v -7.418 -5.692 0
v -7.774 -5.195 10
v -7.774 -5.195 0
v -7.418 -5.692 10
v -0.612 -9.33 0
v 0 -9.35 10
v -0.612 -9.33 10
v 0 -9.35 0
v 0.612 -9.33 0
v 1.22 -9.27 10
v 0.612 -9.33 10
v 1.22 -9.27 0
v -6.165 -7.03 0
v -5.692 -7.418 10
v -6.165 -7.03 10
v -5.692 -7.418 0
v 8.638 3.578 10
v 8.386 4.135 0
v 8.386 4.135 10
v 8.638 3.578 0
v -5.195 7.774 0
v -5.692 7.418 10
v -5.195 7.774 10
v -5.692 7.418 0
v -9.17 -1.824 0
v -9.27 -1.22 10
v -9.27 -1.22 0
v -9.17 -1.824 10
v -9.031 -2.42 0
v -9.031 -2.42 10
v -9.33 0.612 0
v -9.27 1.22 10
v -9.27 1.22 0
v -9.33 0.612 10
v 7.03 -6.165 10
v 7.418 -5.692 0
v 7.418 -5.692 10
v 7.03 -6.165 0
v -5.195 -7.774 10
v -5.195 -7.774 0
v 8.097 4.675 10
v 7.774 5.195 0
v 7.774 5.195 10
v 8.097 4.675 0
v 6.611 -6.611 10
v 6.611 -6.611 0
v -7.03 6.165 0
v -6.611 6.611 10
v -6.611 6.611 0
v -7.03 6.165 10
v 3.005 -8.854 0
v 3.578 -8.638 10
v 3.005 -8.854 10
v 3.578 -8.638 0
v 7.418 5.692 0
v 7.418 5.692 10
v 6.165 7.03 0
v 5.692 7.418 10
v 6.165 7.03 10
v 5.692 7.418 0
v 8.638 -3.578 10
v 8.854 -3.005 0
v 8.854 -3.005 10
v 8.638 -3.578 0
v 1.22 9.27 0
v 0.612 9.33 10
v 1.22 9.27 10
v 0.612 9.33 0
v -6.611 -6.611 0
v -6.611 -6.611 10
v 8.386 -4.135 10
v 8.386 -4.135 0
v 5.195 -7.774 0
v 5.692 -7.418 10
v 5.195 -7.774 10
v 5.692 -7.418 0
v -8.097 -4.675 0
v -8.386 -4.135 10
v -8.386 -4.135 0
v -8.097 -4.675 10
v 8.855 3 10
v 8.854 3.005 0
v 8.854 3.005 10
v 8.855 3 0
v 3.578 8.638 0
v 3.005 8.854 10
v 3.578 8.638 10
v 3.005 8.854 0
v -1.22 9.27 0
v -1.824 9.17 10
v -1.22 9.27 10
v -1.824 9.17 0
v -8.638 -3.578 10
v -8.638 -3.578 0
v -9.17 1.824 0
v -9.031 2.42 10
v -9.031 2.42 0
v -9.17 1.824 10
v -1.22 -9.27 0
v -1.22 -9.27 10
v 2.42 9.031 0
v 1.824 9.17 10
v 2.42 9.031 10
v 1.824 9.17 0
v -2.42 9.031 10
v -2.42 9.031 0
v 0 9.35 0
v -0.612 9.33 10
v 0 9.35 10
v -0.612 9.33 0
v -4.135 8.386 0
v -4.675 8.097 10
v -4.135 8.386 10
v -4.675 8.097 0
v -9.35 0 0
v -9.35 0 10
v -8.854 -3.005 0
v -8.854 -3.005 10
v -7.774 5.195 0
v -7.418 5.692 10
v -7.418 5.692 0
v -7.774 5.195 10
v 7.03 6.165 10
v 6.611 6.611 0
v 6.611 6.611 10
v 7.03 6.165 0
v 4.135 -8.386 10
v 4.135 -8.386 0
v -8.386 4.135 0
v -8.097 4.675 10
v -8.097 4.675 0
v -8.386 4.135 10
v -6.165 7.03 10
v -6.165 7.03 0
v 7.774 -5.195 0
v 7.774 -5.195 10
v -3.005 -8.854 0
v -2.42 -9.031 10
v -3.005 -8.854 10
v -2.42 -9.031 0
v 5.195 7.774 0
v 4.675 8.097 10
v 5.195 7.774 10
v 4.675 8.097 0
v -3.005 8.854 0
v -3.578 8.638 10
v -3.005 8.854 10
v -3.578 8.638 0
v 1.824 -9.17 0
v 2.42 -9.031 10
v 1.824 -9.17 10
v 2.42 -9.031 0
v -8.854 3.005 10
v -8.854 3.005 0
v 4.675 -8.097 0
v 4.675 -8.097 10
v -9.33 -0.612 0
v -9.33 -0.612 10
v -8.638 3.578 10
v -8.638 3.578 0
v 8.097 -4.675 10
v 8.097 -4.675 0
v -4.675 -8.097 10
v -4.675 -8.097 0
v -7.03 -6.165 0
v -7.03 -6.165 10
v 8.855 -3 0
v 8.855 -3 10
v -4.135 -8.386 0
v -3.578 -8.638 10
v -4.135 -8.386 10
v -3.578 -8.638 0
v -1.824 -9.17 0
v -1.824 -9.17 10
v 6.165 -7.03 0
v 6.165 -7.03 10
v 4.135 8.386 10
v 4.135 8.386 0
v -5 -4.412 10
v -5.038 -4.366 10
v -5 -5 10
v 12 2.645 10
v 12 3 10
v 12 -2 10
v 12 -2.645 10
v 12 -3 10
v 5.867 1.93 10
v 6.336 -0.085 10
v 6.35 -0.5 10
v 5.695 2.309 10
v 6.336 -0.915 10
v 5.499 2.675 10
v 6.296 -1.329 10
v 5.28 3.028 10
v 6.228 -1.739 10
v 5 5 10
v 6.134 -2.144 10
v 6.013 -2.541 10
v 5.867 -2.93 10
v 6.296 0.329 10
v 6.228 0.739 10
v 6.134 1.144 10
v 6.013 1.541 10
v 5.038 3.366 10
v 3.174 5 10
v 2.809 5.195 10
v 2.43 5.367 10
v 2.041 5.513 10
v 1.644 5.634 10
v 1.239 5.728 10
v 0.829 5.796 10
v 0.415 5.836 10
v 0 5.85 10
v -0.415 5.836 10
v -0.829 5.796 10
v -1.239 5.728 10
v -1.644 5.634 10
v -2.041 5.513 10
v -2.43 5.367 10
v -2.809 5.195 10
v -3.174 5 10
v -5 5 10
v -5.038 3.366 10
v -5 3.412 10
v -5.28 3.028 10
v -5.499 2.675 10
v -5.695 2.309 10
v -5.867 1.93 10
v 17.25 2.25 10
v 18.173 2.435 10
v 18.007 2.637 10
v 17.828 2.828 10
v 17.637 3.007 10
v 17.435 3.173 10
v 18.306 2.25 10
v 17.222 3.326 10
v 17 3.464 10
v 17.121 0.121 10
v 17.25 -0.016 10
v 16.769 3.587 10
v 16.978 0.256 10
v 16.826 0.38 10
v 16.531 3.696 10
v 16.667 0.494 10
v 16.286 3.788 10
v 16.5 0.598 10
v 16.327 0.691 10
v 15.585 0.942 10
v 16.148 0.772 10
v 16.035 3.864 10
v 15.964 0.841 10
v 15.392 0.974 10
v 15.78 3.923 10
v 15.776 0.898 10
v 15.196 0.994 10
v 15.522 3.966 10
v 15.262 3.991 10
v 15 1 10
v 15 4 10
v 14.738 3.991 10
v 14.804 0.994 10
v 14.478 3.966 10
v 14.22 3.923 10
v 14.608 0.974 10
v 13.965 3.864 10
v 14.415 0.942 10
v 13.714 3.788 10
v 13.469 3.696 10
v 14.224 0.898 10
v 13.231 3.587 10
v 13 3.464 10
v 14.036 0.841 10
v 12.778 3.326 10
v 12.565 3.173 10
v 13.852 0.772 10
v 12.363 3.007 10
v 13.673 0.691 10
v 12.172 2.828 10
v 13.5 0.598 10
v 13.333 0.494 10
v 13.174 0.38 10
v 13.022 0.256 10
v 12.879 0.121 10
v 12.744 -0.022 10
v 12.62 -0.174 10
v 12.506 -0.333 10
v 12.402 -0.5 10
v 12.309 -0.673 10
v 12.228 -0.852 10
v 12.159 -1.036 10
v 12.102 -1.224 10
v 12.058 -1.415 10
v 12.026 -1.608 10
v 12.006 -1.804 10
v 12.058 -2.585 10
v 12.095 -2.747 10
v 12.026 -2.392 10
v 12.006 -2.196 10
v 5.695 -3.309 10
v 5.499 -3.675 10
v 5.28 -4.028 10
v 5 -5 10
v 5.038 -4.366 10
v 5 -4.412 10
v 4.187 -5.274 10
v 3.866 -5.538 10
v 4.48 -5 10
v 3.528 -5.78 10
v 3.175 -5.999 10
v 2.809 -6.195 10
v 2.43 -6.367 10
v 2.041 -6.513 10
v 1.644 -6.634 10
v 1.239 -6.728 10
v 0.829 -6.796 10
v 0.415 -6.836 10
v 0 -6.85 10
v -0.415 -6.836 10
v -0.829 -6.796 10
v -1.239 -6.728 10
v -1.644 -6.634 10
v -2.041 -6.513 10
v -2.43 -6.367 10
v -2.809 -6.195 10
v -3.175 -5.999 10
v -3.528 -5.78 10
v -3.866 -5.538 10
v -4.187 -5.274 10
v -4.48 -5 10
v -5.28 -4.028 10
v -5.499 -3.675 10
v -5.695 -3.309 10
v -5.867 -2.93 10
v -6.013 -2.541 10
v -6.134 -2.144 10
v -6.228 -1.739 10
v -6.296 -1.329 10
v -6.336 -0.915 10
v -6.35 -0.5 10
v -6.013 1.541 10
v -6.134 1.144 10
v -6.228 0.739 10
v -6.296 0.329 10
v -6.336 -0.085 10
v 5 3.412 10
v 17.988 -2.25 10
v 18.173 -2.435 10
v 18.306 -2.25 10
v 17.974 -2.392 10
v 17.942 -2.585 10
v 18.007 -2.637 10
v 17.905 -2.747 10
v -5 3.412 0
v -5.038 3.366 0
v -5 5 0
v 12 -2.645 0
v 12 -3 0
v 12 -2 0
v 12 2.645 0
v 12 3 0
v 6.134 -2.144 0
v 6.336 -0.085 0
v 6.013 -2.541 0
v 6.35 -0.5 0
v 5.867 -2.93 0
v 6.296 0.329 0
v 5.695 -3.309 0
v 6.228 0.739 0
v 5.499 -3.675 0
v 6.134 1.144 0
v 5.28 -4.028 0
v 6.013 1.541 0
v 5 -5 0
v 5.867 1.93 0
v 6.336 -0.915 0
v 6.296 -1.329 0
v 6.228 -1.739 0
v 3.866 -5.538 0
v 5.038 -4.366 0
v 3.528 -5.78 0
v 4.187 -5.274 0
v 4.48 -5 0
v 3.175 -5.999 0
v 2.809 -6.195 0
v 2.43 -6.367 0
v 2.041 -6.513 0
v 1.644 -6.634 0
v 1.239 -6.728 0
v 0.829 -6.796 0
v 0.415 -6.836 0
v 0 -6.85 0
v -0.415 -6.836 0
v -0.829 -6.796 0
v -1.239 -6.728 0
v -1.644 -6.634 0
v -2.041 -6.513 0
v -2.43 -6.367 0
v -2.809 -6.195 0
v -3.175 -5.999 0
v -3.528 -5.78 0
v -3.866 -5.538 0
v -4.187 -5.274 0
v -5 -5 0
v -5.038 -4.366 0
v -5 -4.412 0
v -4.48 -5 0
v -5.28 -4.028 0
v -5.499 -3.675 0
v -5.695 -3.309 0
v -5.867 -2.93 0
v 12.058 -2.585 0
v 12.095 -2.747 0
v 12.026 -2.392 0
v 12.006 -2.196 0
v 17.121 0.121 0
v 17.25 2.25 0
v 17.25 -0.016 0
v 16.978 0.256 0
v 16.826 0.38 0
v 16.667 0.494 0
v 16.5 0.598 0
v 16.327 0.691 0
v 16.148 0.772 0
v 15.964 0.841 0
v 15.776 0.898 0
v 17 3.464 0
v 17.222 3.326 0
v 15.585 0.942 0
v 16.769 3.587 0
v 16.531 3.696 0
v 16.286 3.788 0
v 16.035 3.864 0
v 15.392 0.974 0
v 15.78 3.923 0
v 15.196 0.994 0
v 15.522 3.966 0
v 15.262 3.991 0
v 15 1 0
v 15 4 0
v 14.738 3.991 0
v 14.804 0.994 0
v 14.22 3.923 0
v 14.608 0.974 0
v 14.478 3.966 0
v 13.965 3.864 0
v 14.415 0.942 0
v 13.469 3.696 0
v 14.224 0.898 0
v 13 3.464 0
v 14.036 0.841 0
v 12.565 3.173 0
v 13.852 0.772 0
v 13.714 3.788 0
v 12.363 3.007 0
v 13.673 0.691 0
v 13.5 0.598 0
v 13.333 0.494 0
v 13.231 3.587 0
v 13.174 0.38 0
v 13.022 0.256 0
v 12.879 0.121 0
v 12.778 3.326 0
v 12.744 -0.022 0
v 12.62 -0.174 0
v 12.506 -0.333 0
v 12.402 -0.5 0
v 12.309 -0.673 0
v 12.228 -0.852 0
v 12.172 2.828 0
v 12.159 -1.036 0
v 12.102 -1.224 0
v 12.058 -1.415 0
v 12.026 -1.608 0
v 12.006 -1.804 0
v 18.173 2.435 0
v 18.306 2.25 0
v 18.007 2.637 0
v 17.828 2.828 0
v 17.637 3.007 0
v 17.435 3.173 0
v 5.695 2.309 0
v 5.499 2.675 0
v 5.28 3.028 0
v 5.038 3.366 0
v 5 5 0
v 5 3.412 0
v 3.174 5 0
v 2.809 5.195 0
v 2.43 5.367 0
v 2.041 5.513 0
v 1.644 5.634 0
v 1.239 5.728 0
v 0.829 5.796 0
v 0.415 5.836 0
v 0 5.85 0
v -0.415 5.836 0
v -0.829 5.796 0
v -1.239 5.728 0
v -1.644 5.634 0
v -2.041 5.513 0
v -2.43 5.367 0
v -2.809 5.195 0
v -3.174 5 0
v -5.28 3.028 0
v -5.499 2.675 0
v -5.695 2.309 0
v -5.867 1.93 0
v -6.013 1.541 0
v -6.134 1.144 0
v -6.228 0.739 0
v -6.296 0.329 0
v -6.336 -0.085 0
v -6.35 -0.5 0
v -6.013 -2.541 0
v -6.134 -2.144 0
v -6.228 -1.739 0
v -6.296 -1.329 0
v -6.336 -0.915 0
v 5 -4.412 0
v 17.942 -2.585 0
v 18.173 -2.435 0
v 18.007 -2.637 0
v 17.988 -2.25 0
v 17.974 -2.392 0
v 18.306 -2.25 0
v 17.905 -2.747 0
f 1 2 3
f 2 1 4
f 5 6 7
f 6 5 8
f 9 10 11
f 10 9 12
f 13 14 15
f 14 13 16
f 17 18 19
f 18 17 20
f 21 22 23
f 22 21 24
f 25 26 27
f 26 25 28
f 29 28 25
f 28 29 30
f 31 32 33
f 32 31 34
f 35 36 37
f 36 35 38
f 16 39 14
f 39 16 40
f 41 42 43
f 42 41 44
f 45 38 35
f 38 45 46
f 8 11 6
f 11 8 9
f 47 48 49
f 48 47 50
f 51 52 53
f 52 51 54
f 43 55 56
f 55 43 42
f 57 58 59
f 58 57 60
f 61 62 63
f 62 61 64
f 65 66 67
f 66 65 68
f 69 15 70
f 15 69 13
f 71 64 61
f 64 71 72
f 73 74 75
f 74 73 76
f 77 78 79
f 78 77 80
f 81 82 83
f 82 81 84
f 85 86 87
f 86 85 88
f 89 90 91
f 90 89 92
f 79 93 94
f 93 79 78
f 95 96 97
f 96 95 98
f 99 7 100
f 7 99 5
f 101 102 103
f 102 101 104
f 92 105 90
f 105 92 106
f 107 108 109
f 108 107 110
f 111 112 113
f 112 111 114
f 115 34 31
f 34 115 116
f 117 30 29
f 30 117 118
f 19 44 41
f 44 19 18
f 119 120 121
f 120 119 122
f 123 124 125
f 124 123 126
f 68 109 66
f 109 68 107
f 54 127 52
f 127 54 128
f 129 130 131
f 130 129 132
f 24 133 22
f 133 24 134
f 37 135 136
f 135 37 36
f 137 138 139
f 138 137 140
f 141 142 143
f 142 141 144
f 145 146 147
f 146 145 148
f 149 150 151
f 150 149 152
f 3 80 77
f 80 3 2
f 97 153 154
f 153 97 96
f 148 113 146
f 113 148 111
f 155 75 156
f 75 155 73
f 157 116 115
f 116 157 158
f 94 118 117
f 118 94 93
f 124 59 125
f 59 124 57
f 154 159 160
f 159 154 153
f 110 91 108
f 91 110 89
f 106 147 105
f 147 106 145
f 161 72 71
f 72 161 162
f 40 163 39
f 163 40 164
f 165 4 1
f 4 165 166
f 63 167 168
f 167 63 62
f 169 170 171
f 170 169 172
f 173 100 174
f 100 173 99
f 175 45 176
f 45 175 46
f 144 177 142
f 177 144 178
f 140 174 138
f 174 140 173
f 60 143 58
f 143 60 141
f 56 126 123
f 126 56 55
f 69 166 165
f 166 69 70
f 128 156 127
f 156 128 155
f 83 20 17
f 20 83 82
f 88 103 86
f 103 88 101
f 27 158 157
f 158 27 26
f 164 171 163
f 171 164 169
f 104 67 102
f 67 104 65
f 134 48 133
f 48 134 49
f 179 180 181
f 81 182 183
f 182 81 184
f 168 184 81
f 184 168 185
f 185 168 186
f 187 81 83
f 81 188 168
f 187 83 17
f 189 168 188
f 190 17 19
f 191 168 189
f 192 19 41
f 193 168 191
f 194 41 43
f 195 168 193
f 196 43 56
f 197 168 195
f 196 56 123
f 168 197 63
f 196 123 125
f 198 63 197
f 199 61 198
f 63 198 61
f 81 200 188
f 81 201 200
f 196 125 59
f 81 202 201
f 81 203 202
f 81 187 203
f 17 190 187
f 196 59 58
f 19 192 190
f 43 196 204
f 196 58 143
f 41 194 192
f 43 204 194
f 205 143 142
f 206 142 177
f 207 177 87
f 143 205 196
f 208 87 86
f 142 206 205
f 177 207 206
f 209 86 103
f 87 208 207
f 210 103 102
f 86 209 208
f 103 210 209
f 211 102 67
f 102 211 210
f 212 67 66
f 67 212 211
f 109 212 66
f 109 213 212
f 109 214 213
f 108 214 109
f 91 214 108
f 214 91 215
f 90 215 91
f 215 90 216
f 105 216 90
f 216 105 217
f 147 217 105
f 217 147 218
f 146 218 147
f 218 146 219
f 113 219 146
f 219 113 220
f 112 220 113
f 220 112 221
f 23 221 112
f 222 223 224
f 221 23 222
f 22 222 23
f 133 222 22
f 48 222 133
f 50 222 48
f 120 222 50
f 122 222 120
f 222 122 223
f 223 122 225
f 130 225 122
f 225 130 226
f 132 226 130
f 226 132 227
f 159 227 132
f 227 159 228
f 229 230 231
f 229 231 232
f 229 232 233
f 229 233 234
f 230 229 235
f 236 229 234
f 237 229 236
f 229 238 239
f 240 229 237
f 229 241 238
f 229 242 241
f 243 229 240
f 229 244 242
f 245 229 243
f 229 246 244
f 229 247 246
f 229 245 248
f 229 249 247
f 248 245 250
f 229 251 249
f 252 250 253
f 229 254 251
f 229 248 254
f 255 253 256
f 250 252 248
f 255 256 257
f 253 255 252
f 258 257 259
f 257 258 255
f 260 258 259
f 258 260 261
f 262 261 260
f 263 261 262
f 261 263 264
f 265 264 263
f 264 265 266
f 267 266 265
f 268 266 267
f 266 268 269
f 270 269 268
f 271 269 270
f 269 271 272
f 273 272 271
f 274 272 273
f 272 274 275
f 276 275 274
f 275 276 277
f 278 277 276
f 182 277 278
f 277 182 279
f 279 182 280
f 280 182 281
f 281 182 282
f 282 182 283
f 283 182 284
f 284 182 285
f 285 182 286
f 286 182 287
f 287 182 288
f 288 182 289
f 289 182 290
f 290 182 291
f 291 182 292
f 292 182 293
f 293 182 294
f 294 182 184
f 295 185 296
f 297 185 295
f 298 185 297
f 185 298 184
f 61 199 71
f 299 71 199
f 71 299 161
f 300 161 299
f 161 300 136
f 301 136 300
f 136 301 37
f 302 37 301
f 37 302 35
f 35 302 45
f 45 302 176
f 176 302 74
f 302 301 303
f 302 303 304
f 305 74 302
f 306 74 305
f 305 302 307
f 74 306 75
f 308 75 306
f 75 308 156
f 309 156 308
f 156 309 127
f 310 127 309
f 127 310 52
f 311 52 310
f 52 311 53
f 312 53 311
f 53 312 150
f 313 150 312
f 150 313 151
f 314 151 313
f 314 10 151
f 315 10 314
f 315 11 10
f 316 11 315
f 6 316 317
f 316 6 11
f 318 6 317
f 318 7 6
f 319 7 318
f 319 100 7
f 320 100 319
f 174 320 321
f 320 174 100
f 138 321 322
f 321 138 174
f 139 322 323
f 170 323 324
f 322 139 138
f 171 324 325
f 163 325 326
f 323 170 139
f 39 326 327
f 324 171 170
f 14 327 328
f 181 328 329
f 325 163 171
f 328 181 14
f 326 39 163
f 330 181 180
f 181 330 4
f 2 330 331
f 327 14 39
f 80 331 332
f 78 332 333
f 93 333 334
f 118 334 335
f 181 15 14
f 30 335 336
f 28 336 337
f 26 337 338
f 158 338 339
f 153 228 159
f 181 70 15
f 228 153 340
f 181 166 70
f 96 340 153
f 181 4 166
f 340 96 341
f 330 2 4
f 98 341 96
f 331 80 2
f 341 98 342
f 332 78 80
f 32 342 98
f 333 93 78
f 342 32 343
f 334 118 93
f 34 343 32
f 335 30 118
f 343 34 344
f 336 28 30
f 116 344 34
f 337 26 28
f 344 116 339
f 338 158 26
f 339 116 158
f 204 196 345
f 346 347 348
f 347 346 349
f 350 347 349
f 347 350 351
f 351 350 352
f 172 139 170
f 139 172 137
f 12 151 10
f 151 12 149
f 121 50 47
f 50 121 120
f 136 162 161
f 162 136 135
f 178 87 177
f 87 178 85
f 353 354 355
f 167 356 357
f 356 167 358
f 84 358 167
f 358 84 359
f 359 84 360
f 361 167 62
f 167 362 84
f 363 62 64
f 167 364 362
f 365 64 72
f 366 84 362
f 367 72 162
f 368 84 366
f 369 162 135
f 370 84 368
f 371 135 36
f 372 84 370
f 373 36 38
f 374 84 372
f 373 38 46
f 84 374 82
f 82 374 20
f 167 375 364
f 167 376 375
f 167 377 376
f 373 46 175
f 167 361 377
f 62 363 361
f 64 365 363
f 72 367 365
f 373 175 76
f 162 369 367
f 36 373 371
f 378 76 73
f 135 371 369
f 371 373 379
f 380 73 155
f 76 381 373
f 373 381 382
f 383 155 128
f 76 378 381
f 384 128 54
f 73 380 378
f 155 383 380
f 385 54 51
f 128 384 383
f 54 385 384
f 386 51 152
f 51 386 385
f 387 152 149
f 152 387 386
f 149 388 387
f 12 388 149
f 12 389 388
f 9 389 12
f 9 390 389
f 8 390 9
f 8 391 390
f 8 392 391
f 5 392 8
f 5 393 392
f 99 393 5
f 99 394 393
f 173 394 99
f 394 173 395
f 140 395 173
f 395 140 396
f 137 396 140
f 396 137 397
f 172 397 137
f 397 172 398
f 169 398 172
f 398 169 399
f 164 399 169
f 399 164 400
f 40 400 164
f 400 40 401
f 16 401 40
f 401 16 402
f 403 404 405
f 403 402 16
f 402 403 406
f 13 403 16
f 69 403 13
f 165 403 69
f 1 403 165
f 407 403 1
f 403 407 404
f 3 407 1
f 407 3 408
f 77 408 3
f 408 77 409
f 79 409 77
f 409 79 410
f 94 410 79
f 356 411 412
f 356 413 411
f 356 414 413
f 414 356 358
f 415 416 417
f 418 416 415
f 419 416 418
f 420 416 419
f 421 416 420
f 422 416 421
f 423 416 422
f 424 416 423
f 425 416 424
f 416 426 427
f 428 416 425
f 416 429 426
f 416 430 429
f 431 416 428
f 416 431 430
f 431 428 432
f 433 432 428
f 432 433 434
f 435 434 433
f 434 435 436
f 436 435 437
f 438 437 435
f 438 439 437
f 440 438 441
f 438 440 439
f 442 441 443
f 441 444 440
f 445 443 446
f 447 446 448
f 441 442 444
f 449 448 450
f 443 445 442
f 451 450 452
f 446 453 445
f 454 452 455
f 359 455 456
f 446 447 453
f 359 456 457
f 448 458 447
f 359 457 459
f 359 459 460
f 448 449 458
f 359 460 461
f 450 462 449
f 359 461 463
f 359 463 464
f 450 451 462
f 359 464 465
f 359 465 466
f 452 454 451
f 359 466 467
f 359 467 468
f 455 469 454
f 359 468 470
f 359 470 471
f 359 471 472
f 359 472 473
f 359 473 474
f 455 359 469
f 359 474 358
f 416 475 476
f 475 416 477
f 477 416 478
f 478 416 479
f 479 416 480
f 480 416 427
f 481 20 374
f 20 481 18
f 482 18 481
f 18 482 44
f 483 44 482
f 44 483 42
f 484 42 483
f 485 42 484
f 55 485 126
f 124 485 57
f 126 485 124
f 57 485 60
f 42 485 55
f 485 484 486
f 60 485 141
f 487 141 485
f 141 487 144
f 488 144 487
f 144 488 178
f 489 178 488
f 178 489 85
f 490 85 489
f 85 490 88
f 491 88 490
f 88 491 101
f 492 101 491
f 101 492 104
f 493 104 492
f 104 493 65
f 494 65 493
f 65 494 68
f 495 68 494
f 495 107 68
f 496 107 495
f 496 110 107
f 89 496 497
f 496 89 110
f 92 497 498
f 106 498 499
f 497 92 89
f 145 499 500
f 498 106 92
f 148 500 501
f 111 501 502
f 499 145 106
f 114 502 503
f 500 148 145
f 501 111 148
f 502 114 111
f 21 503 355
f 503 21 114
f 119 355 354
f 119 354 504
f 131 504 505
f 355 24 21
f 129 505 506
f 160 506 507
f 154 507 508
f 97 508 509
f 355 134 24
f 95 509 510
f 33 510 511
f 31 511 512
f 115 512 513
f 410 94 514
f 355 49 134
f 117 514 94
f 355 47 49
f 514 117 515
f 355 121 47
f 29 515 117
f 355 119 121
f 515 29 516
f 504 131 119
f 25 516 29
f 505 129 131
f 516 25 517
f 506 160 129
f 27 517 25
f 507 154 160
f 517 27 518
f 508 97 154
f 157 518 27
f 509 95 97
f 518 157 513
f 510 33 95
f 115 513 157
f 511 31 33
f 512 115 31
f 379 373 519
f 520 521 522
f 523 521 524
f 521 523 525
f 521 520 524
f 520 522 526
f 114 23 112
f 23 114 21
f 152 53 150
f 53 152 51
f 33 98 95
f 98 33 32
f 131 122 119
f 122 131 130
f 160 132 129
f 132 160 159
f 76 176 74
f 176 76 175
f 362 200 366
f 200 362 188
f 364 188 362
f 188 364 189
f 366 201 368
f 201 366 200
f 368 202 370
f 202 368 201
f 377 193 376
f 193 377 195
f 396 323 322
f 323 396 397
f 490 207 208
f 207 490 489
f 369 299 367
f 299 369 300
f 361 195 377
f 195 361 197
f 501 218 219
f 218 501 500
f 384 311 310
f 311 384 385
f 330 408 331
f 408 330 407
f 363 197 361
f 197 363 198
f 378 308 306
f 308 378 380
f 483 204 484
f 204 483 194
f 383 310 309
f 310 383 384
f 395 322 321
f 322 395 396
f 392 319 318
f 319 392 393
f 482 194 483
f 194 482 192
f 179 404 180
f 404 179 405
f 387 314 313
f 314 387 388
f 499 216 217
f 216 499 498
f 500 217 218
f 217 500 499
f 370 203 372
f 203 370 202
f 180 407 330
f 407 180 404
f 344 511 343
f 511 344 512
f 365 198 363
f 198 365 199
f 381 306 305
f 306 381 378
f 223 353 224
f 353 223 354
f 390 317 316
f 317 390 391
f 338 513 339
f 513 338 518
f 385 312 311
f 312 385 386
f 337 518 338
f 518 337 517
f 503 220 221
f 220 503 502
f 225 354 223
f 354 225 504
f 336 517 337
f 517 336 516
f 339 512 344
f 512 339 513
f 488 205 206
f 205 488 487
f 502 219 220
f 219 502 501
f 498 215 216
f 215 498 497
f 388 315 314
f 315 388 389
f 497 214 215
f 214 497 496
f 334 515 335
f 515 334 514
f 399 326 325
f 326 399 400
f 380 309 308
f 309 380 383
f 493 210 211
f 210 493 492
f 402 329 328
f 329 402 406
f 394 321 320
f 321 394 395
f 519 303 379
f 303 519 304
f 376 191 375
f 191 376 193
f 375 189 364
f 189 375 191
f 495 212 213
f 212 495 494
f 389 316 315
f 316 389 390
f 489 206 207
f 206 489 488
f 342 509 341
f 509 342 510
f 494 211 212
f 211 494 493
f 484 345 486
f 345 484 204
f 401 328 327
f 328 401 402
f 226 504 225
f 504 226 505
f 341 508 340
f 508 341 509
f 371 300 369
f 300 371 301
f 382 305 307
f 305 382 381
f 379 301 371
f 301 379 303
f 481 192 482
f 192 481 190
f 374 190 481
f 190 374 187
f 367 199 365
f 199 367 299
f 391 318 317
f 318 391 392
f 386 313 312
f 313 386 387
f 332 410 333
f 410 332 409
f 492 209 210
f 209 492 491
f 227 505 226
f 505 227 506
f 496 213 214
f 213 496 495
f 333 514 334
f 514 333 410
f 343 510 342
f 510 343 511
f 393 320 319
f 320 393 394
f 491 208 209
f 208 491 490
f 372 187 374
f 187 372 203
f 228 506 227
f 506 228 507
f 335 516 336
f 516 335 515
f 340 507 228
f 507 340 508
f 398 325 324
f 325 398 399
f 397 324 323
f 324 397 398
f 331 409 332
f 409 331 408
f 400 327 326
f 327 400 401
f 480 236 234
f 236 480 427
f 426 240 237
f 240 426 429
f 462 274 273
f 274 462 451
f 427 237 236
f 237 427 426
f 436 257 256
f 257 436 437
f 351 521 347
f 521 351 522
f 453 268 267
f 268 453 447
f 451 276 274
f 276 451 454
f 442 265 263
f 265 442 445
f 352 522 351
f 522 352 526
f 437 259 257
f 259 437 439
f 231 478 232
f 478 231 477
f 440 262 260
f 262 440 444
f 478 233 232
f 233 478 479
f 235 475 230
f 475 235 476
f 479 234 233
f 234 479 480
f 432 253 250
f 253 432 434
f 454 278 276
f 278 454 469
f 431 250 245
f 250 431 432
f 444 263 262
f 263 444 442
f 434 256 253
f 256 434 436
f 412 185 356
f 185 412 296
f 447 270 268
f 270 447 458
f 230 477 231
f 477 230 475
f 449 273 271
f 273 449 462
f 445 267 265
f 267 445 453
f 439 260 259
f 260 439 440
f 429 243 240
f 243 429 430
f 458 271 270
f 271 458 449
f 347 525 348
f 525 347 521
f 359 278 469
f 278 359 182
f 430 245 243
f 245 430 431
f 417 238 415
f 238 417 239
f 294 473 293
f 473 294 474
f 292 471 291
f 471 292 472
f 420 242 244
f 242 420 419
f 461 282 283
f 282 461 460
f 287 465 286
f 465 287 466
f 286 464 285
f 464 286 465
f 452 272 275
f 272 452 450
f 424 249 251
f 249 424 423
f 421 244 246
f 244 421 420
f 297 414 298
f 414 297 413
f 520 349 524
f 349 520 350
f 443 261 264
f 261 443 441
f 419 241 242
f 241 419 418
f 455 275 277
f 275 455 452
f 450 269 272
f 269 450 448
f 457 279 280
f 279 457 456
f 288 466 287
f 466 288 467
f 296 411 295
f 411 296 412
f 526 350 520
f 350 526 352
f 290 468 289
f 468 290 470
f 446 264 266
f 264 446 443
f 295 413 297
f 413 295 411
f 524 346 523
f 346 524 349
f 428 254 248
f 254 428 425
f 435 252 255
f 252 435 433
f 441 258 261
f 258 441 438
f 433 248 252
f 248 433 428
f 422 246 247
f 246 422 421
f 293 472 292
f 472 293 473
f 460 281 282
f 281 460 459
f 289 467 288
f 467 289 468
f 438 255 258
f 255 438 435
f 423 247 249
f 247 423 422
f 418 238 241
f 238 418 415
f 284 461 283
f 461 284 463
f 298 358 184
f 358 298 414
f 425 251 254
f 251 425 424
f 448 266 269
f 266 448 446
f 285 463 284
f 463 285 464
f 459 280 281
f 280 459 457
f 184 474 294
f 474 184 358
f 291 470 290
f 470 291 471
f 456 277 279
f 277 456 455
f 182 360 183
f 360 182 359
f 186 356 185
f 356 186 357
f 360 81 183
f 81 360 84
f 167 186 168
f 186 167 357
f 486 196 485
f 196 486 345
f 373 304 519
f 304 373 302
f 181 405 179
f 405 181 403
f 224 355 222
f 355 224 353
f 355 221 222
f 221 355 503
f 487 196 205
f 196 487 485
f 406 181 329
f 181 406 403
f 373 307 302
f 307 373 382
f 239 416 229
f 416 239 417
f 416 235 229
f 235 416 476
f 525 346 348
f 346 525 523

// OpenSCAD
// Tubing clip for a 12.7 mm lab stand rod
// Print orientation: flat on the bed, extruded upward in +Z

$fn = 96;

// ---- Dimensions (mm) ----
ring_od      = 18.7;   // rod ring outer diameter
ring_id      = 12.7;   // rod ring inner diameter (rod bore)
ring_wall    = 3;      // rod ring wall thickness
ring_open    = 10;     // rod ring opening width (along -X)

tube_od      = 8;      // tubing ring outer diameter
tube_id      = 6;      // tubing ring inner diameter
tube_wall    = 2;      // tubing ring wall thickness
tube_open    = 4.5;    // tubing opening width (along +X)

bridge_x0    = 8;      // bridge start (X)
bridge_x1    = 12;     // bridge end (X)
bridge_w     = 6;      // bridge width (Y)

eps          = 0.5;    // cutter overshoot past faces
standoff     = 0.5;    // rod ring centre offset from origin (Y)

// ---- Model ----
difference() {
    union() {
        // Rod ring
        difference() {
            cylinder(d = ring_od, h = 10);
            translate([0, -standoff, 0])
                cylinder(d = ring_id, h = 10);
        }
        // Tubing ring
        translate([15, 0, 0])
            difference() {
                cylinder(d = tube_od, h = 10);
                translate([0, -tube_wall, 0])
                    cylinder(d = tube_id, h = 10);
            }
        // Bridge
        translate([bridge_x0, -bridge_w / 2, 0])
            cube([bridge_x1 - bridge_x0, bridge_w, 10]);
    }
    // Rod ring opening (-X side)
    translate([-ring_open / 2, -ring_open / 2, -eps])
        cube([ring_open, ring_open, 10 + 2 * eps]);
    // Tubing opening (+X side)
    translate([15 + tube_open / 2, -tube_open / 2, -eps])
        cube([tube_open, tube_open, 10 + 2 * eps]);
}
